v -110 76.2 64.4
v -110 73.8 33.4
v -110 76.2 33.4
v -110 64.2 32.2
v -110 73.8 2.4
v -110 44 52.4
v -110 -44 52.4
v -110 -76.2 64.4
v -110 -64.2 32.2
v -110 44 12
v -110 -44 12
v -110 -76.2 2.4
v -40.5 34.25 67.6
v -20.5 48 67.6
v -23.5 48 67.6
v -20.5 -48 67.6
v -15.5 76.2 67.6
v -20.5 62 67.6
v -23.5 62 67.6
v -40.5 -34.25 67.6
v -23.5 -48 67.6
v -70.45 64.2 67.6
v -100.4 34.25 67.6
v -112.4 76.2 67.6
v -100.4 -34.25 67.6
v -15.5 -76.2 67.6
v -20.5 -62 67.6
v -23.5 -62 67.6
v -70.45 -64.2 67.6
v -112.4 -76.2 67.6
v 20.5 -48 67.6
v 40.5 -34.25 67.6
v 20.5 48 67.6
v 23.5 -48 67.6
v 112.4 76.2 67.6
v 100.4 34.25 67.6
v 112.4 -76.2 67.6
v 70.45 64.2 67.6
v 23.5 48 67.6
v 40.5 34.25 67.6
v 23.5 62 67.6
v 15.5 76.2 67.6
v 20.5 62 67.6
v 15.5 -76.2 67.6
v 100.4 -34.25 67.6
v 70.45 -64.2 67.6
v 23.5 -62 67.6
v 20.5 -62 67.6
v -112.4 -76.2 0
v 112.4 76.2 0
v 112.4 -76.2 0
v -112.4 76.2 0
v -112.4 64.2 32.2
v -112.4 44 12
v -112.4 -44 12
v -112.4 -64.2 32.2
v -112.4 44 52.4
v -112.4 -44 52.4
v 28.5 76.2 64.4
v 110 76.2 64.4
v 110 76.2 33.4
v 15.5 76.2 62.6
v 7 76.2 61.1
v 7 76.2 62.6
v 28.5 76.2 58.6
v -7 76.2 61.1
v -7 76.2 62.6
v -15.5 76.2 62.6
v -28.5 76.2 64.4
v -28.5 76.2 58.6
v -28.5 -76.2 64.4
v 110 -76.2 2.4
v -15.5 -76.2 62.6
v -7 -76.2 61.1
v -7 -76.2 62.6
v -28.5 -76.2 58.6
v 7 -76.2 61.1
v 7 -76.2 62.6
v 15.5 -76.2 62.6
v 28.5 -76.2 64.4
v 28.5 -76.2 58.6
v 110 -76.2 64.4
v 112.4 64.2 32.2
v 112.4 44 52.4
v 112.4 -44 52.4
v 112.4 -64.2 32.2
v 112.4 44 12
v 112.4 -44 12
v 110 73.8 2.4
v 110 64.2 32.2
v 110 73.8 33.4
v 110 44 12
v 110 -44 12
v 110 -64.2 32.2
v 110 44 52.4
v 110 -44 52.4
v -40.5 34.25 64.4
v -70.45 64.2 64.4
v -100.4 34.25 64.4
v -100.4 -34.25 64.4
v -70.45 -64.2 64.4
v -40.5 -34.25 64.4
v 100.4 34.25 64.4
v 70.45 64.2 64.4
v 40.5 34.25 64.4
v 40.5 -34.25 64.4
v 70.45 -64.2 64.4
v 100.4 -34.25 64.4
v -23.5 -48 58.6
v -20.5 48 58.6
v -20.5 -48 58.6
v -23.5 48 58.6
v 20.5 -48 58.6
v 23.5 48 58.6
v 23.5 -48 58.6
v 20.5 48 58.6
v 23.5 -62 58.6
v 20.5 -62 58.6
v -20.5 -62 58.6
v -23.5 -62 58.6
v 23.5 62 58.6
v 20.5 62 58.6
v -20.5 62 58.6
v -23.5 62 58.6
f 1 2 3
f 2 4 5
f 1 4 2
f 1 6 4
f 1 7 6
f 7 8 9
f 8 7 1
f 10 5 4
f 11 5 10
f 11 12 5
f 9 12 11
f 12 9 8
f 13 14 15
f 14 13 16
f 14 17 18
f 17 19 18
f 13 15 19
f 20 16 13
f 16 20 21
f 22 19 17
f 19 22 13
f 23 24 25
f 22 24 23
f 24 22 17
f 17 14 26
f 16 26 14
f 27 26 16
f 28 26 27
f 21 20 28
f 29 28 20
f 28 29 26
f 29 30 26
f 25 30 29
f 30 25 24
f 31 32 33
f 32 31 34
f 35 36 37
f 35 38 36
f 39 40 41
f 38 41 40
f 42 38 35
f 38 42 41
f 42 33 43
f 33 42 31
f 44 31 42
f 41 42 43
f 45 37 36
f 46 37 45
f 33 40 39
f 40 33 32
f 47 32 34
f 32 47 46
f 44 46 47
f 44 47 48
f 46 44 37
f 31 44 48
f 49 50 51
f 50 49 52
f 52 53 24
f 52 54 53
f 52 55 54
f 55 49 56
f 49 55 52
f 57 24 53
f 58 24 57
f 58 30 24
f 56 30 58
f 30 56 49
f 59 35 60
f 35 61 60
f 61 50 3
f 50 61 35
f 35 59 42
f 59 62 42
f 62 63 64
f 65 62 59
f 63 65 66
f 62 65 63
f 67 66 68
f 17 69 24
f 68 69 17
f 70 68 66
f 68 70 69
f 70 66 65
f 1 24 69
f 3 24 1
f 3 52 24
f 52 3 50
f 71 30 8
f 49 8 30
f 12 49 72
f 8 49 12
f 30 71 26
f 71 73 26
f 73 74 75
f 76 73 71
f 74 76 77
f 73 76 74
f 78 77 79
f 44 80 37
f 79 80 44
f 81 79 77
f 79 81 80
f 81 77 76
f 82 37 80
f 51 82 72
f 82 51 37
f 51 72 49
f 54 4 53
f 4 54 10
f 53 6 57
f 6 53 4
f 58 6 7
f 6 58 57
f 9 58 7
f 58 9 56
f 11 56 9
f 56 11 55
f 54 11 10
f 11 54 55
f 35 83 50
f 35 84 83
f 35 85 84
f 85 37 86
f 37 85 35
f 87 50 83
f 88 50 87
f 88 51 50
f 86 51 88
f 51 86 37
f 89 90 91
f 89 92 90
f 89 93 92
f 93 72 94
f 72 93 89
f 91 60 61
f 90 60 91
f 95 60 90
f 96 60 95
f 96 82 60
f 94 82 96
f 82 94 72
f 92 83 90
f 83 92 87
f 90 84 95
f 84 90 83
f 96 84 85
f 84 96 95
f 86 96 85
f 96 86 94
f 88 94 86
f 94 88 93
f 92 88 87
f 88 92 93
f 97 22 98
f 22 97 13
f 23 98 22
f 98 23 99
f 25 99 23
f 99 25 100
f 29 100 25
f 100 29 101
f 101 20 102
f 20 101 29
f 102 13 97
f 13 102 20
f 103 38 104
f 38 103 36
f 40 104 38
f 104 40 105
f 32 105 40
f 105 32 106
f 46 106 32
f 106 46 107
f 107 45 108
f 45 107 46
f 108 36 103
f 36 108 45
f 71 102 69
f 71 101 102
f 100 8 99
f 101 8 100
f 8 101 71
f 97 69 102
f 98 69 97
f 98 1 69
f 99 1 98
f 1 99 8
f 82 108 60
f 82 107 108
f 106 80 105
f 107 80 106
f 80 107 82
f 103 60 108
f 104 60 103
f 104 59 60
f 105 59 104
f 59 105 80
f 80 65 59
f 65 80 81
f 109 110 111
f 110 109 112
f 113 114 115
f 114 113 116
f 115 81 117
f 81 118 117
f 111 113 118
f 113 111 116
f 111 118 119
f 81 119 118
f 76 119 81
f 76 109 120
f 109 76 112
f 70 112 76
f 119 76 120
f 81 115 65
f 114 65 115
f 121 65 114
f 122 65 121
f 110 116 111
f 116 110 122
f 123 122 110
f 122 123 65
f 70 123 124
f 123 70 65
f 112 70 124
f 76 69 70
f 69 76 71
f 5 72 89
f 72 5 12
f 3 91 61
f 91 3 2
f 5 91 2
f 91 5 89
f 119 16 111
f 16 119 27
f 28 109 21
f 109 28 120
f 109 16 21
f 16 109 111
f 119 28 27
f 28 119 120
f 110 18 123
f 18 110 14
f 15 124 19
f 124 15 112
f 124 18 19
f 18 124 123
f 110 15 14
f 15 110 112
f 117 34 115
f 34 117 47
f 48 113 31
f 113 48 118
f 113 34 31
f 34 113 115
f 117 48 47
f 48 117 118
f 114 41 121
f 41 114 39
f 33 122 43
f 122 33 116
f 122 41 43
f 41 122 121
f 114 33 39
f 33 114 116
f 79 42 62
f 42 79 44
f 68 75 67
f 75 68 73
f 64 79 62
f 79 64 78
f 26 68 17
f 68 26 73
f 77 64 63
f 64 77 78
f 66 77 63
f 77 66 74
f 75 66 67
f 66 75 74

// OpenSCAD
// Under-keyboard parts tray, hung from one of the front-to-back top support arms
// of a Z-type keyboard stand (Donner, 60-85 cm). Same mounting scheme as
// scarlett-4i4-under-keyboard-mount: a grooved band down the centre of the
// ceiling beds against the UNDERSIDE of the arm, and two straps (zip ties or
// hook-and-loop) pass up through four slots and around the arm.
//
// Orientation: the arm runs FRONT TO BACK, i.e. along this model's Y axis. The
// keyboard lies across the two arms, above. The tray's open side faces the
// player, along -Y.
//
// What it holds: a tuner, picks, a string winder, a wireless receiver. Long
// things lie ACROSS the tray, along X, where there is tray_width to use; the
// depth along the arm is the direction you have to reach into, so it is kept
// short enough to see into.
//
// How open it is. The FRONT is fully open - no lip, no stop. The REAR is open
// above rear_wall_height. The SIDE WALLS are windowed. Only the floor and the
// ceiling are unbroken. Nothing therefore retains a loose item against being
// knocked out of the front; that is a deliberate choice for reach and for looks,
// not an oversight. The side windows stop short of the floor, so there is a
// side_window_curb-high kerb along each side; echo() reports it.
//
// The band down the centre of the ceiling hangs lower than the rest of it, so the
// clear height is not uniform: tray_height under the ceiling skin, less
// (ceiling_thickness - ceiling_skin) under the band itself. Tall items go either
// side of the centre line. echo() reports both numbers.
//
// The ceiling is a full plate rather than an arm-width band, for the same reason
// as in the 4i4 mount: with the arm running along Y, a band alone would reach
// nothing but the rear wall, so the shell has to hang off a plate that reaches
// the side walls. It is thin away from the band and windowed to keep the mass
// down.
//
// The load path is the closed tube formed by ceiling, side walls and floor, which
// is intact at every Y. The rear wall carries nothing, which is why it can be cut
// down to half height without weakening anything.
//
// Print orientation: standing on the REAR face (the +Y face), i.e. rotate 90 deg
// about X in the slicer, or set orient_for_print = true to export it already
// rotated. Every wall is then vertical, with the load path inside the layers, and
// the first layer is the closed ring of floor + side walls + ceiling with the
// rear wall filling most of it.
//
// That makes the build direction -Y, so each layer is one cross-section through
// the depth of the tray, and any surface FACING THE REAR is a downward-facing
// surface in the print. With the front lip gone, the part no longer closes at all
// in the build direction - it simply ends - so the only such surfaces left are
// the window ends, and those taper at 45 degrees (window_2d) so they close one
// extrusion at a time. Nothing is bridged.
// The strap slots still close unsupported as they end, 3 mm across, 42 mm2 each -
// the same detail that printed acceptably on the 4i4 mount.
// No supports needed anywhere.

/* [Tray] */
// Inside dimensions. Width runs across the arm, depth along it, height is the
// clear space under the ceiling skin.
// Nothing here is a fit dimension, so these are preferences rather than
// measurements - but they are also what the part costs: the floor and the
// ceiling are both full-footprint plates, so width x depth sets the mass almost
// linearly. Roughly 1 g of PLA per 8 cm2 of footprint, before the walls.
tray_width  = 220;  // placeholder
tray_depth  = 150;  // placeholder
tray_height = 62;   // placeholder

/* [Stand bar] */
// All measured off the same stand as the 4i4 mount.
bar_width     = 30;   // measured - the arm's horizontal width
bar_play      = 1.0;  // slack in the locating groove
// Depth costs nothing in drop below the arm: the arm sits down inside the groove,
// so only the material UNDER the groove adds height. Made generous instead, which
// improves sideways location and resistance to tipping, and leaves room for the
// rubber strip that resists fore-and-aft creep. See the note at the foot of the
// file.
groove_depth  = 5.0;
// The arm's underside has a hook socket with a ~1 mm raised rim round it. The
// groove floor carries a relief channel down its centre, so the arm beds on two
// shoulders either side and the rim has somewhere to go wherever it sits.
relief_width  = 14;
relief_depth  = 1.5;
band_offset_x = 0;    // shift the band if the arm is not centred under the tray

/* [Straps] */
strap_slot_width     = 14;  // along the arm
strap_slot_thickness = 3;
// Centre-to-centre of the two strap loops, along the arm. Wider is stiffer
// against the tray rocking fore and aft, so it is set as wide as tray_depth
// allows: the slots have to stay clear of the front and rear faces.
strap_spacing_y      = 110;
strap_wall           = 5;   // material each side of a slot; it carries the load

/* [Shell] */
// Thinner than the 4i4 mount's walls: this shell carries a few hundred grams of
// oddments rather than a 1 kg instrument.
side_wall         = 2.4;
rear_wall         = 2.4;
floor_thickness   = 2.4;
ceiling_thickness = 9;    // the band under the groove
ceiling_skin      = 3.2;  // the rest of the ceiling plate
// How much of the back is open, as a fraction of the inside height. 0 gives a
// full-height back, 1 removes the rear wall entirely - which is structurally
// fine but takes away the only thing stopping something being pushed out the
// back, and takes away most of the first layer's area with it.
rear_open_fraction = 0.5;

/* [Lightening windows] */
// The floor and the ceiling stay unbroken - a hole in either is a hole a pick
// goes through. The side walls are windowed, but the window stops side_rim short
// of the outside faces, which leaves a kerb standing above the floor.
side_rim     = 12;
ceiling_rim  = 12;
// Multiplier on the 45 degree end taper. 1.0 gives exactly 45 degrees, the usual
// self-supporting limit; raise it if a first print shows the ends drooping.
window_taper = 1.0;

/* [Output] */
orient_for_print = false;

/* [Hidden] */
$fn = 48;
eps = 0.01;

// --- derived -----------------------------------------------------------------
outer_x = tray_width + 2 * side_wall;
outer_y = tray_depth + rear_wall;

// Z datum: 0 is the top face of the ceiling, which beds against the arm.
ceiling_bottom_z = -ceiling_thickness;   // underside of the band
skin_bottom_z    = -ceiling_skin;        // underside of the plate away from the band
floor_top_z      = skin_bottom_z - tray_height;
floor_bottom_z   = floor_top_z - floor_thickness;

groove_x   = bar_width + bar_play;
slot_mid_x = groove_x / 2 + strap_wall + strap_slot_thickness / 2;
band_x     = groove_x + 2 * (strap_wall + strap_slot_thickness + strap_wall);

rear_in_y        = outer_y / 2 - rear_wall;   // inside face of the rear wall
rear_wall_height = tray_height * (1 - rear_open_fraction);
rear_wall_top_z  = floor_top_z + rear_wall_height;

// Side window extents. The top is set from the ceiling SKIN, not the band: the
// side walls stand where the ceiling is skin only.
side_win_top_z = skin_bottom_z - side_rim;
side_win_bot_z = floor_bottom_z + side_rim;
// How high the unbroken part of the side wall stands above the floor's top face.
side_window_curb = side_win_bot_z - floor_top_z;

// The slots run through the band, which spans the full depth, so nothing stops
// them opening out of the front or rear face except this.
assert(strap_spacing_y / 2 + strap_slot_width / 2 + strap_wall <= outer_y / 2,
       "strap slots reach the end faces - narrow strap_spacing_y or deepen the tray");
assert(side_win_bot_z < side_win_top_z,
       "side_rim leaves no side window - lower it or make the tray taller");

echo(min_wall = min(side_wall, rear_wall, floor_thickness, strap_wall,
                    ceiling_skin, ceiling_thickness - groove_depth - relief_depth));
echo(overall = [outer_x, outer_y, -floor_bottom_z]);
echo(clear_height_under_skin = tray_height,
     clear_height_under_band = tray_height - (ceiling_thickness - ceiling_skin));
echo(floor_area = [tray_width, tray_depth]);
echo(rear_wall_height = rear_wall_height, side_window_curb = side_window_curb);
// What actually matters on this stand: how far the tray reaches below the arm's
// underside, since the angled upright closes in as you go down.
echo(drop_below_arm = -floor_bottom_z - groove_depth);

// Window outline with 45 degree ends along Y. w is the width across the plate,
// l the length along Y. Because Y is the build direction, those ends close one
// layer-width at a time instead of needing a bridge.
module window_2d(w, l) {
    h   = w / 2;
    run = h * window_taper;
    assert(l > 2 * run,
           "window too short along Y for its taper - narrow it, split it, or lower window_taper");
    polygon([[-h, -(l / 2 - run)], [0, -l / 2], [h, -(l / 2 - run)],
             [h,    l / 2 - run],  [0,  l / 2], [-h,   l / 2 - run]]);
}

module floor_plate() {
    translate([-outer_x / 2, -outer_y / 2, floor_bottom_z])
        cube([outer_x, outer_y, floor_thickness]);
}

module side_wall_plate() {
    difference() {
        translate([-side_wall / 2, -outer_y / 2, floor_bottom_z])
            cube([side_wall, outer_y, -floor_bottom_z]);
        translate([-side_wall / 2 - eps, 0, (side_win_top_z + side_win_bot_z) / 2])
            rotate([0, 90, 0])
                linear_extrude(side_wall + 2 * eps)
                    window_2d(side_win_top_z - side_win_bot_z,
                              outer_y - 2 * side_rim);
    }
}

module side_walls() {
    for (s = [-1, 1])
        translate([s * (tray_width + side_wall) / 2, 0, 0])
            side_wall_plate();
}

// Cut down to rear_wall_height so the back is open above it. It carries no load -
// the ceiling/sides/floor tube does that - so its height is free to choose.
module rear_wall_plate() {
    translate([-outer_x / 2, rear_in_y, floor_bottom_z])
        cube([outer_x, rear_wall, rear_wall_top_z - floor_bottom_z]);
}

// Thin plate over the whole footprint, thickened to a band down the centre where
// the arm sits. One window each side of the band; the band itself stays solid
// because the load runs from the straps out to the side walls through it.
module ceiling() {
    left  = [-outer_x / 2 + ceiling_rim,
             band_offset_x - band_x / 2 - ceiling_rim];
    right = [band_offset_x + band_x / 2 + ceiling_rim,
             outer_x / 2 - ceiling_rim];
    l = outer_y - 2 * ceiling_rim;
    union() {
        difference() {
            translate([-outer_x / 2, -outer_y / 2, skin_bottom_z])
                cube([outer_x, outer_y, ceiling_skin]);
            for (win = [left, right])
                translate([(win[0] + win[1]) / 2, 0, skin_bottom_z - eps])
                    linear_extrude(ceiling_skin + 2 * eps)
                        window_2d(win[1] - win[0], l);
        }
        translate([band_offset_x - band_x / 2, -outer_y / 2, ceiling_bottom_z])
            cube([band_x, outer_y, ceiling_thickness]);
    }
}

// The recess the arm sits in, running the full length of the part along Y.
module bar_groove() {
    translate([band_offset_x - groove_x / 2, -outer_y / 2 - eps, -groove_depth])
        cube([groove_x, outer_y + 2 * eps, groove_depth + ceiling_thickness]);
}

// Relief down the centre of the groove floor, clearing the hook socket's rim.
module underside_relief() {
    translate([band_offset_x - relief_width / 2, -outer_y / 2 - eps,
               -(groove_depth + relief_depth)])
        cube([relief_width, outer_y + 2 * eps, relief_depth + eps]);
}

module strap_slots() {
    for (sx = [-1, 1], sy = [-1, 1])
        translate([band_offset_x + sx * slot_mid_x - strap_slot_thickness / 2,
                   sy * strap_spacing_y / 2 - strap_slot_width / 2,
                   ceiling_bottom_z - eps])
            cube([strap_slot_thickness, strap_slot_width,
                  ceiling_thickness + 2 * eps]);
}

module body() {
    difference() {
        union() {
            floor_plate();
            side_walls();
            rear_wall_plate();
            ceiling();
        }
        bar_groove();
        underside_relief();
        strap_slots();
    }
}

// The internal Z datum is the arm contact plane, so body() is built entirely at
// negative Z. Both branches lift it onto Z = 0 - otherwise it sits underneath
// OpenSCAD's build platform in the GUI and renders as an empty view.
module main() {
    if (orient_for_print)
        translate([0, 0, outer_y / 2]) rotate([-90, 0, 0]) body();
    else
        translate([0, 0, -floor_bottom_z]) body();
}

main();

// Note on fore-and-aft holding force, carried over from the 4i4 mount. The strap
// is all that resists sliding ALONG the arm, because the groove walls are
// parallel to it. Bare nylon on painted steel gives roughly 0.25 friction
// coefficient; a 1.5 mm strip of rubber in the groove (shelf liner, inner tube)
// takes it to ~0.8. The tray is far lighter than the interface and nothing pulls
// on it, so the margin here is not tight - but the strip costs nothing and stops
// the tray creeping along the arm when it is knocked.
